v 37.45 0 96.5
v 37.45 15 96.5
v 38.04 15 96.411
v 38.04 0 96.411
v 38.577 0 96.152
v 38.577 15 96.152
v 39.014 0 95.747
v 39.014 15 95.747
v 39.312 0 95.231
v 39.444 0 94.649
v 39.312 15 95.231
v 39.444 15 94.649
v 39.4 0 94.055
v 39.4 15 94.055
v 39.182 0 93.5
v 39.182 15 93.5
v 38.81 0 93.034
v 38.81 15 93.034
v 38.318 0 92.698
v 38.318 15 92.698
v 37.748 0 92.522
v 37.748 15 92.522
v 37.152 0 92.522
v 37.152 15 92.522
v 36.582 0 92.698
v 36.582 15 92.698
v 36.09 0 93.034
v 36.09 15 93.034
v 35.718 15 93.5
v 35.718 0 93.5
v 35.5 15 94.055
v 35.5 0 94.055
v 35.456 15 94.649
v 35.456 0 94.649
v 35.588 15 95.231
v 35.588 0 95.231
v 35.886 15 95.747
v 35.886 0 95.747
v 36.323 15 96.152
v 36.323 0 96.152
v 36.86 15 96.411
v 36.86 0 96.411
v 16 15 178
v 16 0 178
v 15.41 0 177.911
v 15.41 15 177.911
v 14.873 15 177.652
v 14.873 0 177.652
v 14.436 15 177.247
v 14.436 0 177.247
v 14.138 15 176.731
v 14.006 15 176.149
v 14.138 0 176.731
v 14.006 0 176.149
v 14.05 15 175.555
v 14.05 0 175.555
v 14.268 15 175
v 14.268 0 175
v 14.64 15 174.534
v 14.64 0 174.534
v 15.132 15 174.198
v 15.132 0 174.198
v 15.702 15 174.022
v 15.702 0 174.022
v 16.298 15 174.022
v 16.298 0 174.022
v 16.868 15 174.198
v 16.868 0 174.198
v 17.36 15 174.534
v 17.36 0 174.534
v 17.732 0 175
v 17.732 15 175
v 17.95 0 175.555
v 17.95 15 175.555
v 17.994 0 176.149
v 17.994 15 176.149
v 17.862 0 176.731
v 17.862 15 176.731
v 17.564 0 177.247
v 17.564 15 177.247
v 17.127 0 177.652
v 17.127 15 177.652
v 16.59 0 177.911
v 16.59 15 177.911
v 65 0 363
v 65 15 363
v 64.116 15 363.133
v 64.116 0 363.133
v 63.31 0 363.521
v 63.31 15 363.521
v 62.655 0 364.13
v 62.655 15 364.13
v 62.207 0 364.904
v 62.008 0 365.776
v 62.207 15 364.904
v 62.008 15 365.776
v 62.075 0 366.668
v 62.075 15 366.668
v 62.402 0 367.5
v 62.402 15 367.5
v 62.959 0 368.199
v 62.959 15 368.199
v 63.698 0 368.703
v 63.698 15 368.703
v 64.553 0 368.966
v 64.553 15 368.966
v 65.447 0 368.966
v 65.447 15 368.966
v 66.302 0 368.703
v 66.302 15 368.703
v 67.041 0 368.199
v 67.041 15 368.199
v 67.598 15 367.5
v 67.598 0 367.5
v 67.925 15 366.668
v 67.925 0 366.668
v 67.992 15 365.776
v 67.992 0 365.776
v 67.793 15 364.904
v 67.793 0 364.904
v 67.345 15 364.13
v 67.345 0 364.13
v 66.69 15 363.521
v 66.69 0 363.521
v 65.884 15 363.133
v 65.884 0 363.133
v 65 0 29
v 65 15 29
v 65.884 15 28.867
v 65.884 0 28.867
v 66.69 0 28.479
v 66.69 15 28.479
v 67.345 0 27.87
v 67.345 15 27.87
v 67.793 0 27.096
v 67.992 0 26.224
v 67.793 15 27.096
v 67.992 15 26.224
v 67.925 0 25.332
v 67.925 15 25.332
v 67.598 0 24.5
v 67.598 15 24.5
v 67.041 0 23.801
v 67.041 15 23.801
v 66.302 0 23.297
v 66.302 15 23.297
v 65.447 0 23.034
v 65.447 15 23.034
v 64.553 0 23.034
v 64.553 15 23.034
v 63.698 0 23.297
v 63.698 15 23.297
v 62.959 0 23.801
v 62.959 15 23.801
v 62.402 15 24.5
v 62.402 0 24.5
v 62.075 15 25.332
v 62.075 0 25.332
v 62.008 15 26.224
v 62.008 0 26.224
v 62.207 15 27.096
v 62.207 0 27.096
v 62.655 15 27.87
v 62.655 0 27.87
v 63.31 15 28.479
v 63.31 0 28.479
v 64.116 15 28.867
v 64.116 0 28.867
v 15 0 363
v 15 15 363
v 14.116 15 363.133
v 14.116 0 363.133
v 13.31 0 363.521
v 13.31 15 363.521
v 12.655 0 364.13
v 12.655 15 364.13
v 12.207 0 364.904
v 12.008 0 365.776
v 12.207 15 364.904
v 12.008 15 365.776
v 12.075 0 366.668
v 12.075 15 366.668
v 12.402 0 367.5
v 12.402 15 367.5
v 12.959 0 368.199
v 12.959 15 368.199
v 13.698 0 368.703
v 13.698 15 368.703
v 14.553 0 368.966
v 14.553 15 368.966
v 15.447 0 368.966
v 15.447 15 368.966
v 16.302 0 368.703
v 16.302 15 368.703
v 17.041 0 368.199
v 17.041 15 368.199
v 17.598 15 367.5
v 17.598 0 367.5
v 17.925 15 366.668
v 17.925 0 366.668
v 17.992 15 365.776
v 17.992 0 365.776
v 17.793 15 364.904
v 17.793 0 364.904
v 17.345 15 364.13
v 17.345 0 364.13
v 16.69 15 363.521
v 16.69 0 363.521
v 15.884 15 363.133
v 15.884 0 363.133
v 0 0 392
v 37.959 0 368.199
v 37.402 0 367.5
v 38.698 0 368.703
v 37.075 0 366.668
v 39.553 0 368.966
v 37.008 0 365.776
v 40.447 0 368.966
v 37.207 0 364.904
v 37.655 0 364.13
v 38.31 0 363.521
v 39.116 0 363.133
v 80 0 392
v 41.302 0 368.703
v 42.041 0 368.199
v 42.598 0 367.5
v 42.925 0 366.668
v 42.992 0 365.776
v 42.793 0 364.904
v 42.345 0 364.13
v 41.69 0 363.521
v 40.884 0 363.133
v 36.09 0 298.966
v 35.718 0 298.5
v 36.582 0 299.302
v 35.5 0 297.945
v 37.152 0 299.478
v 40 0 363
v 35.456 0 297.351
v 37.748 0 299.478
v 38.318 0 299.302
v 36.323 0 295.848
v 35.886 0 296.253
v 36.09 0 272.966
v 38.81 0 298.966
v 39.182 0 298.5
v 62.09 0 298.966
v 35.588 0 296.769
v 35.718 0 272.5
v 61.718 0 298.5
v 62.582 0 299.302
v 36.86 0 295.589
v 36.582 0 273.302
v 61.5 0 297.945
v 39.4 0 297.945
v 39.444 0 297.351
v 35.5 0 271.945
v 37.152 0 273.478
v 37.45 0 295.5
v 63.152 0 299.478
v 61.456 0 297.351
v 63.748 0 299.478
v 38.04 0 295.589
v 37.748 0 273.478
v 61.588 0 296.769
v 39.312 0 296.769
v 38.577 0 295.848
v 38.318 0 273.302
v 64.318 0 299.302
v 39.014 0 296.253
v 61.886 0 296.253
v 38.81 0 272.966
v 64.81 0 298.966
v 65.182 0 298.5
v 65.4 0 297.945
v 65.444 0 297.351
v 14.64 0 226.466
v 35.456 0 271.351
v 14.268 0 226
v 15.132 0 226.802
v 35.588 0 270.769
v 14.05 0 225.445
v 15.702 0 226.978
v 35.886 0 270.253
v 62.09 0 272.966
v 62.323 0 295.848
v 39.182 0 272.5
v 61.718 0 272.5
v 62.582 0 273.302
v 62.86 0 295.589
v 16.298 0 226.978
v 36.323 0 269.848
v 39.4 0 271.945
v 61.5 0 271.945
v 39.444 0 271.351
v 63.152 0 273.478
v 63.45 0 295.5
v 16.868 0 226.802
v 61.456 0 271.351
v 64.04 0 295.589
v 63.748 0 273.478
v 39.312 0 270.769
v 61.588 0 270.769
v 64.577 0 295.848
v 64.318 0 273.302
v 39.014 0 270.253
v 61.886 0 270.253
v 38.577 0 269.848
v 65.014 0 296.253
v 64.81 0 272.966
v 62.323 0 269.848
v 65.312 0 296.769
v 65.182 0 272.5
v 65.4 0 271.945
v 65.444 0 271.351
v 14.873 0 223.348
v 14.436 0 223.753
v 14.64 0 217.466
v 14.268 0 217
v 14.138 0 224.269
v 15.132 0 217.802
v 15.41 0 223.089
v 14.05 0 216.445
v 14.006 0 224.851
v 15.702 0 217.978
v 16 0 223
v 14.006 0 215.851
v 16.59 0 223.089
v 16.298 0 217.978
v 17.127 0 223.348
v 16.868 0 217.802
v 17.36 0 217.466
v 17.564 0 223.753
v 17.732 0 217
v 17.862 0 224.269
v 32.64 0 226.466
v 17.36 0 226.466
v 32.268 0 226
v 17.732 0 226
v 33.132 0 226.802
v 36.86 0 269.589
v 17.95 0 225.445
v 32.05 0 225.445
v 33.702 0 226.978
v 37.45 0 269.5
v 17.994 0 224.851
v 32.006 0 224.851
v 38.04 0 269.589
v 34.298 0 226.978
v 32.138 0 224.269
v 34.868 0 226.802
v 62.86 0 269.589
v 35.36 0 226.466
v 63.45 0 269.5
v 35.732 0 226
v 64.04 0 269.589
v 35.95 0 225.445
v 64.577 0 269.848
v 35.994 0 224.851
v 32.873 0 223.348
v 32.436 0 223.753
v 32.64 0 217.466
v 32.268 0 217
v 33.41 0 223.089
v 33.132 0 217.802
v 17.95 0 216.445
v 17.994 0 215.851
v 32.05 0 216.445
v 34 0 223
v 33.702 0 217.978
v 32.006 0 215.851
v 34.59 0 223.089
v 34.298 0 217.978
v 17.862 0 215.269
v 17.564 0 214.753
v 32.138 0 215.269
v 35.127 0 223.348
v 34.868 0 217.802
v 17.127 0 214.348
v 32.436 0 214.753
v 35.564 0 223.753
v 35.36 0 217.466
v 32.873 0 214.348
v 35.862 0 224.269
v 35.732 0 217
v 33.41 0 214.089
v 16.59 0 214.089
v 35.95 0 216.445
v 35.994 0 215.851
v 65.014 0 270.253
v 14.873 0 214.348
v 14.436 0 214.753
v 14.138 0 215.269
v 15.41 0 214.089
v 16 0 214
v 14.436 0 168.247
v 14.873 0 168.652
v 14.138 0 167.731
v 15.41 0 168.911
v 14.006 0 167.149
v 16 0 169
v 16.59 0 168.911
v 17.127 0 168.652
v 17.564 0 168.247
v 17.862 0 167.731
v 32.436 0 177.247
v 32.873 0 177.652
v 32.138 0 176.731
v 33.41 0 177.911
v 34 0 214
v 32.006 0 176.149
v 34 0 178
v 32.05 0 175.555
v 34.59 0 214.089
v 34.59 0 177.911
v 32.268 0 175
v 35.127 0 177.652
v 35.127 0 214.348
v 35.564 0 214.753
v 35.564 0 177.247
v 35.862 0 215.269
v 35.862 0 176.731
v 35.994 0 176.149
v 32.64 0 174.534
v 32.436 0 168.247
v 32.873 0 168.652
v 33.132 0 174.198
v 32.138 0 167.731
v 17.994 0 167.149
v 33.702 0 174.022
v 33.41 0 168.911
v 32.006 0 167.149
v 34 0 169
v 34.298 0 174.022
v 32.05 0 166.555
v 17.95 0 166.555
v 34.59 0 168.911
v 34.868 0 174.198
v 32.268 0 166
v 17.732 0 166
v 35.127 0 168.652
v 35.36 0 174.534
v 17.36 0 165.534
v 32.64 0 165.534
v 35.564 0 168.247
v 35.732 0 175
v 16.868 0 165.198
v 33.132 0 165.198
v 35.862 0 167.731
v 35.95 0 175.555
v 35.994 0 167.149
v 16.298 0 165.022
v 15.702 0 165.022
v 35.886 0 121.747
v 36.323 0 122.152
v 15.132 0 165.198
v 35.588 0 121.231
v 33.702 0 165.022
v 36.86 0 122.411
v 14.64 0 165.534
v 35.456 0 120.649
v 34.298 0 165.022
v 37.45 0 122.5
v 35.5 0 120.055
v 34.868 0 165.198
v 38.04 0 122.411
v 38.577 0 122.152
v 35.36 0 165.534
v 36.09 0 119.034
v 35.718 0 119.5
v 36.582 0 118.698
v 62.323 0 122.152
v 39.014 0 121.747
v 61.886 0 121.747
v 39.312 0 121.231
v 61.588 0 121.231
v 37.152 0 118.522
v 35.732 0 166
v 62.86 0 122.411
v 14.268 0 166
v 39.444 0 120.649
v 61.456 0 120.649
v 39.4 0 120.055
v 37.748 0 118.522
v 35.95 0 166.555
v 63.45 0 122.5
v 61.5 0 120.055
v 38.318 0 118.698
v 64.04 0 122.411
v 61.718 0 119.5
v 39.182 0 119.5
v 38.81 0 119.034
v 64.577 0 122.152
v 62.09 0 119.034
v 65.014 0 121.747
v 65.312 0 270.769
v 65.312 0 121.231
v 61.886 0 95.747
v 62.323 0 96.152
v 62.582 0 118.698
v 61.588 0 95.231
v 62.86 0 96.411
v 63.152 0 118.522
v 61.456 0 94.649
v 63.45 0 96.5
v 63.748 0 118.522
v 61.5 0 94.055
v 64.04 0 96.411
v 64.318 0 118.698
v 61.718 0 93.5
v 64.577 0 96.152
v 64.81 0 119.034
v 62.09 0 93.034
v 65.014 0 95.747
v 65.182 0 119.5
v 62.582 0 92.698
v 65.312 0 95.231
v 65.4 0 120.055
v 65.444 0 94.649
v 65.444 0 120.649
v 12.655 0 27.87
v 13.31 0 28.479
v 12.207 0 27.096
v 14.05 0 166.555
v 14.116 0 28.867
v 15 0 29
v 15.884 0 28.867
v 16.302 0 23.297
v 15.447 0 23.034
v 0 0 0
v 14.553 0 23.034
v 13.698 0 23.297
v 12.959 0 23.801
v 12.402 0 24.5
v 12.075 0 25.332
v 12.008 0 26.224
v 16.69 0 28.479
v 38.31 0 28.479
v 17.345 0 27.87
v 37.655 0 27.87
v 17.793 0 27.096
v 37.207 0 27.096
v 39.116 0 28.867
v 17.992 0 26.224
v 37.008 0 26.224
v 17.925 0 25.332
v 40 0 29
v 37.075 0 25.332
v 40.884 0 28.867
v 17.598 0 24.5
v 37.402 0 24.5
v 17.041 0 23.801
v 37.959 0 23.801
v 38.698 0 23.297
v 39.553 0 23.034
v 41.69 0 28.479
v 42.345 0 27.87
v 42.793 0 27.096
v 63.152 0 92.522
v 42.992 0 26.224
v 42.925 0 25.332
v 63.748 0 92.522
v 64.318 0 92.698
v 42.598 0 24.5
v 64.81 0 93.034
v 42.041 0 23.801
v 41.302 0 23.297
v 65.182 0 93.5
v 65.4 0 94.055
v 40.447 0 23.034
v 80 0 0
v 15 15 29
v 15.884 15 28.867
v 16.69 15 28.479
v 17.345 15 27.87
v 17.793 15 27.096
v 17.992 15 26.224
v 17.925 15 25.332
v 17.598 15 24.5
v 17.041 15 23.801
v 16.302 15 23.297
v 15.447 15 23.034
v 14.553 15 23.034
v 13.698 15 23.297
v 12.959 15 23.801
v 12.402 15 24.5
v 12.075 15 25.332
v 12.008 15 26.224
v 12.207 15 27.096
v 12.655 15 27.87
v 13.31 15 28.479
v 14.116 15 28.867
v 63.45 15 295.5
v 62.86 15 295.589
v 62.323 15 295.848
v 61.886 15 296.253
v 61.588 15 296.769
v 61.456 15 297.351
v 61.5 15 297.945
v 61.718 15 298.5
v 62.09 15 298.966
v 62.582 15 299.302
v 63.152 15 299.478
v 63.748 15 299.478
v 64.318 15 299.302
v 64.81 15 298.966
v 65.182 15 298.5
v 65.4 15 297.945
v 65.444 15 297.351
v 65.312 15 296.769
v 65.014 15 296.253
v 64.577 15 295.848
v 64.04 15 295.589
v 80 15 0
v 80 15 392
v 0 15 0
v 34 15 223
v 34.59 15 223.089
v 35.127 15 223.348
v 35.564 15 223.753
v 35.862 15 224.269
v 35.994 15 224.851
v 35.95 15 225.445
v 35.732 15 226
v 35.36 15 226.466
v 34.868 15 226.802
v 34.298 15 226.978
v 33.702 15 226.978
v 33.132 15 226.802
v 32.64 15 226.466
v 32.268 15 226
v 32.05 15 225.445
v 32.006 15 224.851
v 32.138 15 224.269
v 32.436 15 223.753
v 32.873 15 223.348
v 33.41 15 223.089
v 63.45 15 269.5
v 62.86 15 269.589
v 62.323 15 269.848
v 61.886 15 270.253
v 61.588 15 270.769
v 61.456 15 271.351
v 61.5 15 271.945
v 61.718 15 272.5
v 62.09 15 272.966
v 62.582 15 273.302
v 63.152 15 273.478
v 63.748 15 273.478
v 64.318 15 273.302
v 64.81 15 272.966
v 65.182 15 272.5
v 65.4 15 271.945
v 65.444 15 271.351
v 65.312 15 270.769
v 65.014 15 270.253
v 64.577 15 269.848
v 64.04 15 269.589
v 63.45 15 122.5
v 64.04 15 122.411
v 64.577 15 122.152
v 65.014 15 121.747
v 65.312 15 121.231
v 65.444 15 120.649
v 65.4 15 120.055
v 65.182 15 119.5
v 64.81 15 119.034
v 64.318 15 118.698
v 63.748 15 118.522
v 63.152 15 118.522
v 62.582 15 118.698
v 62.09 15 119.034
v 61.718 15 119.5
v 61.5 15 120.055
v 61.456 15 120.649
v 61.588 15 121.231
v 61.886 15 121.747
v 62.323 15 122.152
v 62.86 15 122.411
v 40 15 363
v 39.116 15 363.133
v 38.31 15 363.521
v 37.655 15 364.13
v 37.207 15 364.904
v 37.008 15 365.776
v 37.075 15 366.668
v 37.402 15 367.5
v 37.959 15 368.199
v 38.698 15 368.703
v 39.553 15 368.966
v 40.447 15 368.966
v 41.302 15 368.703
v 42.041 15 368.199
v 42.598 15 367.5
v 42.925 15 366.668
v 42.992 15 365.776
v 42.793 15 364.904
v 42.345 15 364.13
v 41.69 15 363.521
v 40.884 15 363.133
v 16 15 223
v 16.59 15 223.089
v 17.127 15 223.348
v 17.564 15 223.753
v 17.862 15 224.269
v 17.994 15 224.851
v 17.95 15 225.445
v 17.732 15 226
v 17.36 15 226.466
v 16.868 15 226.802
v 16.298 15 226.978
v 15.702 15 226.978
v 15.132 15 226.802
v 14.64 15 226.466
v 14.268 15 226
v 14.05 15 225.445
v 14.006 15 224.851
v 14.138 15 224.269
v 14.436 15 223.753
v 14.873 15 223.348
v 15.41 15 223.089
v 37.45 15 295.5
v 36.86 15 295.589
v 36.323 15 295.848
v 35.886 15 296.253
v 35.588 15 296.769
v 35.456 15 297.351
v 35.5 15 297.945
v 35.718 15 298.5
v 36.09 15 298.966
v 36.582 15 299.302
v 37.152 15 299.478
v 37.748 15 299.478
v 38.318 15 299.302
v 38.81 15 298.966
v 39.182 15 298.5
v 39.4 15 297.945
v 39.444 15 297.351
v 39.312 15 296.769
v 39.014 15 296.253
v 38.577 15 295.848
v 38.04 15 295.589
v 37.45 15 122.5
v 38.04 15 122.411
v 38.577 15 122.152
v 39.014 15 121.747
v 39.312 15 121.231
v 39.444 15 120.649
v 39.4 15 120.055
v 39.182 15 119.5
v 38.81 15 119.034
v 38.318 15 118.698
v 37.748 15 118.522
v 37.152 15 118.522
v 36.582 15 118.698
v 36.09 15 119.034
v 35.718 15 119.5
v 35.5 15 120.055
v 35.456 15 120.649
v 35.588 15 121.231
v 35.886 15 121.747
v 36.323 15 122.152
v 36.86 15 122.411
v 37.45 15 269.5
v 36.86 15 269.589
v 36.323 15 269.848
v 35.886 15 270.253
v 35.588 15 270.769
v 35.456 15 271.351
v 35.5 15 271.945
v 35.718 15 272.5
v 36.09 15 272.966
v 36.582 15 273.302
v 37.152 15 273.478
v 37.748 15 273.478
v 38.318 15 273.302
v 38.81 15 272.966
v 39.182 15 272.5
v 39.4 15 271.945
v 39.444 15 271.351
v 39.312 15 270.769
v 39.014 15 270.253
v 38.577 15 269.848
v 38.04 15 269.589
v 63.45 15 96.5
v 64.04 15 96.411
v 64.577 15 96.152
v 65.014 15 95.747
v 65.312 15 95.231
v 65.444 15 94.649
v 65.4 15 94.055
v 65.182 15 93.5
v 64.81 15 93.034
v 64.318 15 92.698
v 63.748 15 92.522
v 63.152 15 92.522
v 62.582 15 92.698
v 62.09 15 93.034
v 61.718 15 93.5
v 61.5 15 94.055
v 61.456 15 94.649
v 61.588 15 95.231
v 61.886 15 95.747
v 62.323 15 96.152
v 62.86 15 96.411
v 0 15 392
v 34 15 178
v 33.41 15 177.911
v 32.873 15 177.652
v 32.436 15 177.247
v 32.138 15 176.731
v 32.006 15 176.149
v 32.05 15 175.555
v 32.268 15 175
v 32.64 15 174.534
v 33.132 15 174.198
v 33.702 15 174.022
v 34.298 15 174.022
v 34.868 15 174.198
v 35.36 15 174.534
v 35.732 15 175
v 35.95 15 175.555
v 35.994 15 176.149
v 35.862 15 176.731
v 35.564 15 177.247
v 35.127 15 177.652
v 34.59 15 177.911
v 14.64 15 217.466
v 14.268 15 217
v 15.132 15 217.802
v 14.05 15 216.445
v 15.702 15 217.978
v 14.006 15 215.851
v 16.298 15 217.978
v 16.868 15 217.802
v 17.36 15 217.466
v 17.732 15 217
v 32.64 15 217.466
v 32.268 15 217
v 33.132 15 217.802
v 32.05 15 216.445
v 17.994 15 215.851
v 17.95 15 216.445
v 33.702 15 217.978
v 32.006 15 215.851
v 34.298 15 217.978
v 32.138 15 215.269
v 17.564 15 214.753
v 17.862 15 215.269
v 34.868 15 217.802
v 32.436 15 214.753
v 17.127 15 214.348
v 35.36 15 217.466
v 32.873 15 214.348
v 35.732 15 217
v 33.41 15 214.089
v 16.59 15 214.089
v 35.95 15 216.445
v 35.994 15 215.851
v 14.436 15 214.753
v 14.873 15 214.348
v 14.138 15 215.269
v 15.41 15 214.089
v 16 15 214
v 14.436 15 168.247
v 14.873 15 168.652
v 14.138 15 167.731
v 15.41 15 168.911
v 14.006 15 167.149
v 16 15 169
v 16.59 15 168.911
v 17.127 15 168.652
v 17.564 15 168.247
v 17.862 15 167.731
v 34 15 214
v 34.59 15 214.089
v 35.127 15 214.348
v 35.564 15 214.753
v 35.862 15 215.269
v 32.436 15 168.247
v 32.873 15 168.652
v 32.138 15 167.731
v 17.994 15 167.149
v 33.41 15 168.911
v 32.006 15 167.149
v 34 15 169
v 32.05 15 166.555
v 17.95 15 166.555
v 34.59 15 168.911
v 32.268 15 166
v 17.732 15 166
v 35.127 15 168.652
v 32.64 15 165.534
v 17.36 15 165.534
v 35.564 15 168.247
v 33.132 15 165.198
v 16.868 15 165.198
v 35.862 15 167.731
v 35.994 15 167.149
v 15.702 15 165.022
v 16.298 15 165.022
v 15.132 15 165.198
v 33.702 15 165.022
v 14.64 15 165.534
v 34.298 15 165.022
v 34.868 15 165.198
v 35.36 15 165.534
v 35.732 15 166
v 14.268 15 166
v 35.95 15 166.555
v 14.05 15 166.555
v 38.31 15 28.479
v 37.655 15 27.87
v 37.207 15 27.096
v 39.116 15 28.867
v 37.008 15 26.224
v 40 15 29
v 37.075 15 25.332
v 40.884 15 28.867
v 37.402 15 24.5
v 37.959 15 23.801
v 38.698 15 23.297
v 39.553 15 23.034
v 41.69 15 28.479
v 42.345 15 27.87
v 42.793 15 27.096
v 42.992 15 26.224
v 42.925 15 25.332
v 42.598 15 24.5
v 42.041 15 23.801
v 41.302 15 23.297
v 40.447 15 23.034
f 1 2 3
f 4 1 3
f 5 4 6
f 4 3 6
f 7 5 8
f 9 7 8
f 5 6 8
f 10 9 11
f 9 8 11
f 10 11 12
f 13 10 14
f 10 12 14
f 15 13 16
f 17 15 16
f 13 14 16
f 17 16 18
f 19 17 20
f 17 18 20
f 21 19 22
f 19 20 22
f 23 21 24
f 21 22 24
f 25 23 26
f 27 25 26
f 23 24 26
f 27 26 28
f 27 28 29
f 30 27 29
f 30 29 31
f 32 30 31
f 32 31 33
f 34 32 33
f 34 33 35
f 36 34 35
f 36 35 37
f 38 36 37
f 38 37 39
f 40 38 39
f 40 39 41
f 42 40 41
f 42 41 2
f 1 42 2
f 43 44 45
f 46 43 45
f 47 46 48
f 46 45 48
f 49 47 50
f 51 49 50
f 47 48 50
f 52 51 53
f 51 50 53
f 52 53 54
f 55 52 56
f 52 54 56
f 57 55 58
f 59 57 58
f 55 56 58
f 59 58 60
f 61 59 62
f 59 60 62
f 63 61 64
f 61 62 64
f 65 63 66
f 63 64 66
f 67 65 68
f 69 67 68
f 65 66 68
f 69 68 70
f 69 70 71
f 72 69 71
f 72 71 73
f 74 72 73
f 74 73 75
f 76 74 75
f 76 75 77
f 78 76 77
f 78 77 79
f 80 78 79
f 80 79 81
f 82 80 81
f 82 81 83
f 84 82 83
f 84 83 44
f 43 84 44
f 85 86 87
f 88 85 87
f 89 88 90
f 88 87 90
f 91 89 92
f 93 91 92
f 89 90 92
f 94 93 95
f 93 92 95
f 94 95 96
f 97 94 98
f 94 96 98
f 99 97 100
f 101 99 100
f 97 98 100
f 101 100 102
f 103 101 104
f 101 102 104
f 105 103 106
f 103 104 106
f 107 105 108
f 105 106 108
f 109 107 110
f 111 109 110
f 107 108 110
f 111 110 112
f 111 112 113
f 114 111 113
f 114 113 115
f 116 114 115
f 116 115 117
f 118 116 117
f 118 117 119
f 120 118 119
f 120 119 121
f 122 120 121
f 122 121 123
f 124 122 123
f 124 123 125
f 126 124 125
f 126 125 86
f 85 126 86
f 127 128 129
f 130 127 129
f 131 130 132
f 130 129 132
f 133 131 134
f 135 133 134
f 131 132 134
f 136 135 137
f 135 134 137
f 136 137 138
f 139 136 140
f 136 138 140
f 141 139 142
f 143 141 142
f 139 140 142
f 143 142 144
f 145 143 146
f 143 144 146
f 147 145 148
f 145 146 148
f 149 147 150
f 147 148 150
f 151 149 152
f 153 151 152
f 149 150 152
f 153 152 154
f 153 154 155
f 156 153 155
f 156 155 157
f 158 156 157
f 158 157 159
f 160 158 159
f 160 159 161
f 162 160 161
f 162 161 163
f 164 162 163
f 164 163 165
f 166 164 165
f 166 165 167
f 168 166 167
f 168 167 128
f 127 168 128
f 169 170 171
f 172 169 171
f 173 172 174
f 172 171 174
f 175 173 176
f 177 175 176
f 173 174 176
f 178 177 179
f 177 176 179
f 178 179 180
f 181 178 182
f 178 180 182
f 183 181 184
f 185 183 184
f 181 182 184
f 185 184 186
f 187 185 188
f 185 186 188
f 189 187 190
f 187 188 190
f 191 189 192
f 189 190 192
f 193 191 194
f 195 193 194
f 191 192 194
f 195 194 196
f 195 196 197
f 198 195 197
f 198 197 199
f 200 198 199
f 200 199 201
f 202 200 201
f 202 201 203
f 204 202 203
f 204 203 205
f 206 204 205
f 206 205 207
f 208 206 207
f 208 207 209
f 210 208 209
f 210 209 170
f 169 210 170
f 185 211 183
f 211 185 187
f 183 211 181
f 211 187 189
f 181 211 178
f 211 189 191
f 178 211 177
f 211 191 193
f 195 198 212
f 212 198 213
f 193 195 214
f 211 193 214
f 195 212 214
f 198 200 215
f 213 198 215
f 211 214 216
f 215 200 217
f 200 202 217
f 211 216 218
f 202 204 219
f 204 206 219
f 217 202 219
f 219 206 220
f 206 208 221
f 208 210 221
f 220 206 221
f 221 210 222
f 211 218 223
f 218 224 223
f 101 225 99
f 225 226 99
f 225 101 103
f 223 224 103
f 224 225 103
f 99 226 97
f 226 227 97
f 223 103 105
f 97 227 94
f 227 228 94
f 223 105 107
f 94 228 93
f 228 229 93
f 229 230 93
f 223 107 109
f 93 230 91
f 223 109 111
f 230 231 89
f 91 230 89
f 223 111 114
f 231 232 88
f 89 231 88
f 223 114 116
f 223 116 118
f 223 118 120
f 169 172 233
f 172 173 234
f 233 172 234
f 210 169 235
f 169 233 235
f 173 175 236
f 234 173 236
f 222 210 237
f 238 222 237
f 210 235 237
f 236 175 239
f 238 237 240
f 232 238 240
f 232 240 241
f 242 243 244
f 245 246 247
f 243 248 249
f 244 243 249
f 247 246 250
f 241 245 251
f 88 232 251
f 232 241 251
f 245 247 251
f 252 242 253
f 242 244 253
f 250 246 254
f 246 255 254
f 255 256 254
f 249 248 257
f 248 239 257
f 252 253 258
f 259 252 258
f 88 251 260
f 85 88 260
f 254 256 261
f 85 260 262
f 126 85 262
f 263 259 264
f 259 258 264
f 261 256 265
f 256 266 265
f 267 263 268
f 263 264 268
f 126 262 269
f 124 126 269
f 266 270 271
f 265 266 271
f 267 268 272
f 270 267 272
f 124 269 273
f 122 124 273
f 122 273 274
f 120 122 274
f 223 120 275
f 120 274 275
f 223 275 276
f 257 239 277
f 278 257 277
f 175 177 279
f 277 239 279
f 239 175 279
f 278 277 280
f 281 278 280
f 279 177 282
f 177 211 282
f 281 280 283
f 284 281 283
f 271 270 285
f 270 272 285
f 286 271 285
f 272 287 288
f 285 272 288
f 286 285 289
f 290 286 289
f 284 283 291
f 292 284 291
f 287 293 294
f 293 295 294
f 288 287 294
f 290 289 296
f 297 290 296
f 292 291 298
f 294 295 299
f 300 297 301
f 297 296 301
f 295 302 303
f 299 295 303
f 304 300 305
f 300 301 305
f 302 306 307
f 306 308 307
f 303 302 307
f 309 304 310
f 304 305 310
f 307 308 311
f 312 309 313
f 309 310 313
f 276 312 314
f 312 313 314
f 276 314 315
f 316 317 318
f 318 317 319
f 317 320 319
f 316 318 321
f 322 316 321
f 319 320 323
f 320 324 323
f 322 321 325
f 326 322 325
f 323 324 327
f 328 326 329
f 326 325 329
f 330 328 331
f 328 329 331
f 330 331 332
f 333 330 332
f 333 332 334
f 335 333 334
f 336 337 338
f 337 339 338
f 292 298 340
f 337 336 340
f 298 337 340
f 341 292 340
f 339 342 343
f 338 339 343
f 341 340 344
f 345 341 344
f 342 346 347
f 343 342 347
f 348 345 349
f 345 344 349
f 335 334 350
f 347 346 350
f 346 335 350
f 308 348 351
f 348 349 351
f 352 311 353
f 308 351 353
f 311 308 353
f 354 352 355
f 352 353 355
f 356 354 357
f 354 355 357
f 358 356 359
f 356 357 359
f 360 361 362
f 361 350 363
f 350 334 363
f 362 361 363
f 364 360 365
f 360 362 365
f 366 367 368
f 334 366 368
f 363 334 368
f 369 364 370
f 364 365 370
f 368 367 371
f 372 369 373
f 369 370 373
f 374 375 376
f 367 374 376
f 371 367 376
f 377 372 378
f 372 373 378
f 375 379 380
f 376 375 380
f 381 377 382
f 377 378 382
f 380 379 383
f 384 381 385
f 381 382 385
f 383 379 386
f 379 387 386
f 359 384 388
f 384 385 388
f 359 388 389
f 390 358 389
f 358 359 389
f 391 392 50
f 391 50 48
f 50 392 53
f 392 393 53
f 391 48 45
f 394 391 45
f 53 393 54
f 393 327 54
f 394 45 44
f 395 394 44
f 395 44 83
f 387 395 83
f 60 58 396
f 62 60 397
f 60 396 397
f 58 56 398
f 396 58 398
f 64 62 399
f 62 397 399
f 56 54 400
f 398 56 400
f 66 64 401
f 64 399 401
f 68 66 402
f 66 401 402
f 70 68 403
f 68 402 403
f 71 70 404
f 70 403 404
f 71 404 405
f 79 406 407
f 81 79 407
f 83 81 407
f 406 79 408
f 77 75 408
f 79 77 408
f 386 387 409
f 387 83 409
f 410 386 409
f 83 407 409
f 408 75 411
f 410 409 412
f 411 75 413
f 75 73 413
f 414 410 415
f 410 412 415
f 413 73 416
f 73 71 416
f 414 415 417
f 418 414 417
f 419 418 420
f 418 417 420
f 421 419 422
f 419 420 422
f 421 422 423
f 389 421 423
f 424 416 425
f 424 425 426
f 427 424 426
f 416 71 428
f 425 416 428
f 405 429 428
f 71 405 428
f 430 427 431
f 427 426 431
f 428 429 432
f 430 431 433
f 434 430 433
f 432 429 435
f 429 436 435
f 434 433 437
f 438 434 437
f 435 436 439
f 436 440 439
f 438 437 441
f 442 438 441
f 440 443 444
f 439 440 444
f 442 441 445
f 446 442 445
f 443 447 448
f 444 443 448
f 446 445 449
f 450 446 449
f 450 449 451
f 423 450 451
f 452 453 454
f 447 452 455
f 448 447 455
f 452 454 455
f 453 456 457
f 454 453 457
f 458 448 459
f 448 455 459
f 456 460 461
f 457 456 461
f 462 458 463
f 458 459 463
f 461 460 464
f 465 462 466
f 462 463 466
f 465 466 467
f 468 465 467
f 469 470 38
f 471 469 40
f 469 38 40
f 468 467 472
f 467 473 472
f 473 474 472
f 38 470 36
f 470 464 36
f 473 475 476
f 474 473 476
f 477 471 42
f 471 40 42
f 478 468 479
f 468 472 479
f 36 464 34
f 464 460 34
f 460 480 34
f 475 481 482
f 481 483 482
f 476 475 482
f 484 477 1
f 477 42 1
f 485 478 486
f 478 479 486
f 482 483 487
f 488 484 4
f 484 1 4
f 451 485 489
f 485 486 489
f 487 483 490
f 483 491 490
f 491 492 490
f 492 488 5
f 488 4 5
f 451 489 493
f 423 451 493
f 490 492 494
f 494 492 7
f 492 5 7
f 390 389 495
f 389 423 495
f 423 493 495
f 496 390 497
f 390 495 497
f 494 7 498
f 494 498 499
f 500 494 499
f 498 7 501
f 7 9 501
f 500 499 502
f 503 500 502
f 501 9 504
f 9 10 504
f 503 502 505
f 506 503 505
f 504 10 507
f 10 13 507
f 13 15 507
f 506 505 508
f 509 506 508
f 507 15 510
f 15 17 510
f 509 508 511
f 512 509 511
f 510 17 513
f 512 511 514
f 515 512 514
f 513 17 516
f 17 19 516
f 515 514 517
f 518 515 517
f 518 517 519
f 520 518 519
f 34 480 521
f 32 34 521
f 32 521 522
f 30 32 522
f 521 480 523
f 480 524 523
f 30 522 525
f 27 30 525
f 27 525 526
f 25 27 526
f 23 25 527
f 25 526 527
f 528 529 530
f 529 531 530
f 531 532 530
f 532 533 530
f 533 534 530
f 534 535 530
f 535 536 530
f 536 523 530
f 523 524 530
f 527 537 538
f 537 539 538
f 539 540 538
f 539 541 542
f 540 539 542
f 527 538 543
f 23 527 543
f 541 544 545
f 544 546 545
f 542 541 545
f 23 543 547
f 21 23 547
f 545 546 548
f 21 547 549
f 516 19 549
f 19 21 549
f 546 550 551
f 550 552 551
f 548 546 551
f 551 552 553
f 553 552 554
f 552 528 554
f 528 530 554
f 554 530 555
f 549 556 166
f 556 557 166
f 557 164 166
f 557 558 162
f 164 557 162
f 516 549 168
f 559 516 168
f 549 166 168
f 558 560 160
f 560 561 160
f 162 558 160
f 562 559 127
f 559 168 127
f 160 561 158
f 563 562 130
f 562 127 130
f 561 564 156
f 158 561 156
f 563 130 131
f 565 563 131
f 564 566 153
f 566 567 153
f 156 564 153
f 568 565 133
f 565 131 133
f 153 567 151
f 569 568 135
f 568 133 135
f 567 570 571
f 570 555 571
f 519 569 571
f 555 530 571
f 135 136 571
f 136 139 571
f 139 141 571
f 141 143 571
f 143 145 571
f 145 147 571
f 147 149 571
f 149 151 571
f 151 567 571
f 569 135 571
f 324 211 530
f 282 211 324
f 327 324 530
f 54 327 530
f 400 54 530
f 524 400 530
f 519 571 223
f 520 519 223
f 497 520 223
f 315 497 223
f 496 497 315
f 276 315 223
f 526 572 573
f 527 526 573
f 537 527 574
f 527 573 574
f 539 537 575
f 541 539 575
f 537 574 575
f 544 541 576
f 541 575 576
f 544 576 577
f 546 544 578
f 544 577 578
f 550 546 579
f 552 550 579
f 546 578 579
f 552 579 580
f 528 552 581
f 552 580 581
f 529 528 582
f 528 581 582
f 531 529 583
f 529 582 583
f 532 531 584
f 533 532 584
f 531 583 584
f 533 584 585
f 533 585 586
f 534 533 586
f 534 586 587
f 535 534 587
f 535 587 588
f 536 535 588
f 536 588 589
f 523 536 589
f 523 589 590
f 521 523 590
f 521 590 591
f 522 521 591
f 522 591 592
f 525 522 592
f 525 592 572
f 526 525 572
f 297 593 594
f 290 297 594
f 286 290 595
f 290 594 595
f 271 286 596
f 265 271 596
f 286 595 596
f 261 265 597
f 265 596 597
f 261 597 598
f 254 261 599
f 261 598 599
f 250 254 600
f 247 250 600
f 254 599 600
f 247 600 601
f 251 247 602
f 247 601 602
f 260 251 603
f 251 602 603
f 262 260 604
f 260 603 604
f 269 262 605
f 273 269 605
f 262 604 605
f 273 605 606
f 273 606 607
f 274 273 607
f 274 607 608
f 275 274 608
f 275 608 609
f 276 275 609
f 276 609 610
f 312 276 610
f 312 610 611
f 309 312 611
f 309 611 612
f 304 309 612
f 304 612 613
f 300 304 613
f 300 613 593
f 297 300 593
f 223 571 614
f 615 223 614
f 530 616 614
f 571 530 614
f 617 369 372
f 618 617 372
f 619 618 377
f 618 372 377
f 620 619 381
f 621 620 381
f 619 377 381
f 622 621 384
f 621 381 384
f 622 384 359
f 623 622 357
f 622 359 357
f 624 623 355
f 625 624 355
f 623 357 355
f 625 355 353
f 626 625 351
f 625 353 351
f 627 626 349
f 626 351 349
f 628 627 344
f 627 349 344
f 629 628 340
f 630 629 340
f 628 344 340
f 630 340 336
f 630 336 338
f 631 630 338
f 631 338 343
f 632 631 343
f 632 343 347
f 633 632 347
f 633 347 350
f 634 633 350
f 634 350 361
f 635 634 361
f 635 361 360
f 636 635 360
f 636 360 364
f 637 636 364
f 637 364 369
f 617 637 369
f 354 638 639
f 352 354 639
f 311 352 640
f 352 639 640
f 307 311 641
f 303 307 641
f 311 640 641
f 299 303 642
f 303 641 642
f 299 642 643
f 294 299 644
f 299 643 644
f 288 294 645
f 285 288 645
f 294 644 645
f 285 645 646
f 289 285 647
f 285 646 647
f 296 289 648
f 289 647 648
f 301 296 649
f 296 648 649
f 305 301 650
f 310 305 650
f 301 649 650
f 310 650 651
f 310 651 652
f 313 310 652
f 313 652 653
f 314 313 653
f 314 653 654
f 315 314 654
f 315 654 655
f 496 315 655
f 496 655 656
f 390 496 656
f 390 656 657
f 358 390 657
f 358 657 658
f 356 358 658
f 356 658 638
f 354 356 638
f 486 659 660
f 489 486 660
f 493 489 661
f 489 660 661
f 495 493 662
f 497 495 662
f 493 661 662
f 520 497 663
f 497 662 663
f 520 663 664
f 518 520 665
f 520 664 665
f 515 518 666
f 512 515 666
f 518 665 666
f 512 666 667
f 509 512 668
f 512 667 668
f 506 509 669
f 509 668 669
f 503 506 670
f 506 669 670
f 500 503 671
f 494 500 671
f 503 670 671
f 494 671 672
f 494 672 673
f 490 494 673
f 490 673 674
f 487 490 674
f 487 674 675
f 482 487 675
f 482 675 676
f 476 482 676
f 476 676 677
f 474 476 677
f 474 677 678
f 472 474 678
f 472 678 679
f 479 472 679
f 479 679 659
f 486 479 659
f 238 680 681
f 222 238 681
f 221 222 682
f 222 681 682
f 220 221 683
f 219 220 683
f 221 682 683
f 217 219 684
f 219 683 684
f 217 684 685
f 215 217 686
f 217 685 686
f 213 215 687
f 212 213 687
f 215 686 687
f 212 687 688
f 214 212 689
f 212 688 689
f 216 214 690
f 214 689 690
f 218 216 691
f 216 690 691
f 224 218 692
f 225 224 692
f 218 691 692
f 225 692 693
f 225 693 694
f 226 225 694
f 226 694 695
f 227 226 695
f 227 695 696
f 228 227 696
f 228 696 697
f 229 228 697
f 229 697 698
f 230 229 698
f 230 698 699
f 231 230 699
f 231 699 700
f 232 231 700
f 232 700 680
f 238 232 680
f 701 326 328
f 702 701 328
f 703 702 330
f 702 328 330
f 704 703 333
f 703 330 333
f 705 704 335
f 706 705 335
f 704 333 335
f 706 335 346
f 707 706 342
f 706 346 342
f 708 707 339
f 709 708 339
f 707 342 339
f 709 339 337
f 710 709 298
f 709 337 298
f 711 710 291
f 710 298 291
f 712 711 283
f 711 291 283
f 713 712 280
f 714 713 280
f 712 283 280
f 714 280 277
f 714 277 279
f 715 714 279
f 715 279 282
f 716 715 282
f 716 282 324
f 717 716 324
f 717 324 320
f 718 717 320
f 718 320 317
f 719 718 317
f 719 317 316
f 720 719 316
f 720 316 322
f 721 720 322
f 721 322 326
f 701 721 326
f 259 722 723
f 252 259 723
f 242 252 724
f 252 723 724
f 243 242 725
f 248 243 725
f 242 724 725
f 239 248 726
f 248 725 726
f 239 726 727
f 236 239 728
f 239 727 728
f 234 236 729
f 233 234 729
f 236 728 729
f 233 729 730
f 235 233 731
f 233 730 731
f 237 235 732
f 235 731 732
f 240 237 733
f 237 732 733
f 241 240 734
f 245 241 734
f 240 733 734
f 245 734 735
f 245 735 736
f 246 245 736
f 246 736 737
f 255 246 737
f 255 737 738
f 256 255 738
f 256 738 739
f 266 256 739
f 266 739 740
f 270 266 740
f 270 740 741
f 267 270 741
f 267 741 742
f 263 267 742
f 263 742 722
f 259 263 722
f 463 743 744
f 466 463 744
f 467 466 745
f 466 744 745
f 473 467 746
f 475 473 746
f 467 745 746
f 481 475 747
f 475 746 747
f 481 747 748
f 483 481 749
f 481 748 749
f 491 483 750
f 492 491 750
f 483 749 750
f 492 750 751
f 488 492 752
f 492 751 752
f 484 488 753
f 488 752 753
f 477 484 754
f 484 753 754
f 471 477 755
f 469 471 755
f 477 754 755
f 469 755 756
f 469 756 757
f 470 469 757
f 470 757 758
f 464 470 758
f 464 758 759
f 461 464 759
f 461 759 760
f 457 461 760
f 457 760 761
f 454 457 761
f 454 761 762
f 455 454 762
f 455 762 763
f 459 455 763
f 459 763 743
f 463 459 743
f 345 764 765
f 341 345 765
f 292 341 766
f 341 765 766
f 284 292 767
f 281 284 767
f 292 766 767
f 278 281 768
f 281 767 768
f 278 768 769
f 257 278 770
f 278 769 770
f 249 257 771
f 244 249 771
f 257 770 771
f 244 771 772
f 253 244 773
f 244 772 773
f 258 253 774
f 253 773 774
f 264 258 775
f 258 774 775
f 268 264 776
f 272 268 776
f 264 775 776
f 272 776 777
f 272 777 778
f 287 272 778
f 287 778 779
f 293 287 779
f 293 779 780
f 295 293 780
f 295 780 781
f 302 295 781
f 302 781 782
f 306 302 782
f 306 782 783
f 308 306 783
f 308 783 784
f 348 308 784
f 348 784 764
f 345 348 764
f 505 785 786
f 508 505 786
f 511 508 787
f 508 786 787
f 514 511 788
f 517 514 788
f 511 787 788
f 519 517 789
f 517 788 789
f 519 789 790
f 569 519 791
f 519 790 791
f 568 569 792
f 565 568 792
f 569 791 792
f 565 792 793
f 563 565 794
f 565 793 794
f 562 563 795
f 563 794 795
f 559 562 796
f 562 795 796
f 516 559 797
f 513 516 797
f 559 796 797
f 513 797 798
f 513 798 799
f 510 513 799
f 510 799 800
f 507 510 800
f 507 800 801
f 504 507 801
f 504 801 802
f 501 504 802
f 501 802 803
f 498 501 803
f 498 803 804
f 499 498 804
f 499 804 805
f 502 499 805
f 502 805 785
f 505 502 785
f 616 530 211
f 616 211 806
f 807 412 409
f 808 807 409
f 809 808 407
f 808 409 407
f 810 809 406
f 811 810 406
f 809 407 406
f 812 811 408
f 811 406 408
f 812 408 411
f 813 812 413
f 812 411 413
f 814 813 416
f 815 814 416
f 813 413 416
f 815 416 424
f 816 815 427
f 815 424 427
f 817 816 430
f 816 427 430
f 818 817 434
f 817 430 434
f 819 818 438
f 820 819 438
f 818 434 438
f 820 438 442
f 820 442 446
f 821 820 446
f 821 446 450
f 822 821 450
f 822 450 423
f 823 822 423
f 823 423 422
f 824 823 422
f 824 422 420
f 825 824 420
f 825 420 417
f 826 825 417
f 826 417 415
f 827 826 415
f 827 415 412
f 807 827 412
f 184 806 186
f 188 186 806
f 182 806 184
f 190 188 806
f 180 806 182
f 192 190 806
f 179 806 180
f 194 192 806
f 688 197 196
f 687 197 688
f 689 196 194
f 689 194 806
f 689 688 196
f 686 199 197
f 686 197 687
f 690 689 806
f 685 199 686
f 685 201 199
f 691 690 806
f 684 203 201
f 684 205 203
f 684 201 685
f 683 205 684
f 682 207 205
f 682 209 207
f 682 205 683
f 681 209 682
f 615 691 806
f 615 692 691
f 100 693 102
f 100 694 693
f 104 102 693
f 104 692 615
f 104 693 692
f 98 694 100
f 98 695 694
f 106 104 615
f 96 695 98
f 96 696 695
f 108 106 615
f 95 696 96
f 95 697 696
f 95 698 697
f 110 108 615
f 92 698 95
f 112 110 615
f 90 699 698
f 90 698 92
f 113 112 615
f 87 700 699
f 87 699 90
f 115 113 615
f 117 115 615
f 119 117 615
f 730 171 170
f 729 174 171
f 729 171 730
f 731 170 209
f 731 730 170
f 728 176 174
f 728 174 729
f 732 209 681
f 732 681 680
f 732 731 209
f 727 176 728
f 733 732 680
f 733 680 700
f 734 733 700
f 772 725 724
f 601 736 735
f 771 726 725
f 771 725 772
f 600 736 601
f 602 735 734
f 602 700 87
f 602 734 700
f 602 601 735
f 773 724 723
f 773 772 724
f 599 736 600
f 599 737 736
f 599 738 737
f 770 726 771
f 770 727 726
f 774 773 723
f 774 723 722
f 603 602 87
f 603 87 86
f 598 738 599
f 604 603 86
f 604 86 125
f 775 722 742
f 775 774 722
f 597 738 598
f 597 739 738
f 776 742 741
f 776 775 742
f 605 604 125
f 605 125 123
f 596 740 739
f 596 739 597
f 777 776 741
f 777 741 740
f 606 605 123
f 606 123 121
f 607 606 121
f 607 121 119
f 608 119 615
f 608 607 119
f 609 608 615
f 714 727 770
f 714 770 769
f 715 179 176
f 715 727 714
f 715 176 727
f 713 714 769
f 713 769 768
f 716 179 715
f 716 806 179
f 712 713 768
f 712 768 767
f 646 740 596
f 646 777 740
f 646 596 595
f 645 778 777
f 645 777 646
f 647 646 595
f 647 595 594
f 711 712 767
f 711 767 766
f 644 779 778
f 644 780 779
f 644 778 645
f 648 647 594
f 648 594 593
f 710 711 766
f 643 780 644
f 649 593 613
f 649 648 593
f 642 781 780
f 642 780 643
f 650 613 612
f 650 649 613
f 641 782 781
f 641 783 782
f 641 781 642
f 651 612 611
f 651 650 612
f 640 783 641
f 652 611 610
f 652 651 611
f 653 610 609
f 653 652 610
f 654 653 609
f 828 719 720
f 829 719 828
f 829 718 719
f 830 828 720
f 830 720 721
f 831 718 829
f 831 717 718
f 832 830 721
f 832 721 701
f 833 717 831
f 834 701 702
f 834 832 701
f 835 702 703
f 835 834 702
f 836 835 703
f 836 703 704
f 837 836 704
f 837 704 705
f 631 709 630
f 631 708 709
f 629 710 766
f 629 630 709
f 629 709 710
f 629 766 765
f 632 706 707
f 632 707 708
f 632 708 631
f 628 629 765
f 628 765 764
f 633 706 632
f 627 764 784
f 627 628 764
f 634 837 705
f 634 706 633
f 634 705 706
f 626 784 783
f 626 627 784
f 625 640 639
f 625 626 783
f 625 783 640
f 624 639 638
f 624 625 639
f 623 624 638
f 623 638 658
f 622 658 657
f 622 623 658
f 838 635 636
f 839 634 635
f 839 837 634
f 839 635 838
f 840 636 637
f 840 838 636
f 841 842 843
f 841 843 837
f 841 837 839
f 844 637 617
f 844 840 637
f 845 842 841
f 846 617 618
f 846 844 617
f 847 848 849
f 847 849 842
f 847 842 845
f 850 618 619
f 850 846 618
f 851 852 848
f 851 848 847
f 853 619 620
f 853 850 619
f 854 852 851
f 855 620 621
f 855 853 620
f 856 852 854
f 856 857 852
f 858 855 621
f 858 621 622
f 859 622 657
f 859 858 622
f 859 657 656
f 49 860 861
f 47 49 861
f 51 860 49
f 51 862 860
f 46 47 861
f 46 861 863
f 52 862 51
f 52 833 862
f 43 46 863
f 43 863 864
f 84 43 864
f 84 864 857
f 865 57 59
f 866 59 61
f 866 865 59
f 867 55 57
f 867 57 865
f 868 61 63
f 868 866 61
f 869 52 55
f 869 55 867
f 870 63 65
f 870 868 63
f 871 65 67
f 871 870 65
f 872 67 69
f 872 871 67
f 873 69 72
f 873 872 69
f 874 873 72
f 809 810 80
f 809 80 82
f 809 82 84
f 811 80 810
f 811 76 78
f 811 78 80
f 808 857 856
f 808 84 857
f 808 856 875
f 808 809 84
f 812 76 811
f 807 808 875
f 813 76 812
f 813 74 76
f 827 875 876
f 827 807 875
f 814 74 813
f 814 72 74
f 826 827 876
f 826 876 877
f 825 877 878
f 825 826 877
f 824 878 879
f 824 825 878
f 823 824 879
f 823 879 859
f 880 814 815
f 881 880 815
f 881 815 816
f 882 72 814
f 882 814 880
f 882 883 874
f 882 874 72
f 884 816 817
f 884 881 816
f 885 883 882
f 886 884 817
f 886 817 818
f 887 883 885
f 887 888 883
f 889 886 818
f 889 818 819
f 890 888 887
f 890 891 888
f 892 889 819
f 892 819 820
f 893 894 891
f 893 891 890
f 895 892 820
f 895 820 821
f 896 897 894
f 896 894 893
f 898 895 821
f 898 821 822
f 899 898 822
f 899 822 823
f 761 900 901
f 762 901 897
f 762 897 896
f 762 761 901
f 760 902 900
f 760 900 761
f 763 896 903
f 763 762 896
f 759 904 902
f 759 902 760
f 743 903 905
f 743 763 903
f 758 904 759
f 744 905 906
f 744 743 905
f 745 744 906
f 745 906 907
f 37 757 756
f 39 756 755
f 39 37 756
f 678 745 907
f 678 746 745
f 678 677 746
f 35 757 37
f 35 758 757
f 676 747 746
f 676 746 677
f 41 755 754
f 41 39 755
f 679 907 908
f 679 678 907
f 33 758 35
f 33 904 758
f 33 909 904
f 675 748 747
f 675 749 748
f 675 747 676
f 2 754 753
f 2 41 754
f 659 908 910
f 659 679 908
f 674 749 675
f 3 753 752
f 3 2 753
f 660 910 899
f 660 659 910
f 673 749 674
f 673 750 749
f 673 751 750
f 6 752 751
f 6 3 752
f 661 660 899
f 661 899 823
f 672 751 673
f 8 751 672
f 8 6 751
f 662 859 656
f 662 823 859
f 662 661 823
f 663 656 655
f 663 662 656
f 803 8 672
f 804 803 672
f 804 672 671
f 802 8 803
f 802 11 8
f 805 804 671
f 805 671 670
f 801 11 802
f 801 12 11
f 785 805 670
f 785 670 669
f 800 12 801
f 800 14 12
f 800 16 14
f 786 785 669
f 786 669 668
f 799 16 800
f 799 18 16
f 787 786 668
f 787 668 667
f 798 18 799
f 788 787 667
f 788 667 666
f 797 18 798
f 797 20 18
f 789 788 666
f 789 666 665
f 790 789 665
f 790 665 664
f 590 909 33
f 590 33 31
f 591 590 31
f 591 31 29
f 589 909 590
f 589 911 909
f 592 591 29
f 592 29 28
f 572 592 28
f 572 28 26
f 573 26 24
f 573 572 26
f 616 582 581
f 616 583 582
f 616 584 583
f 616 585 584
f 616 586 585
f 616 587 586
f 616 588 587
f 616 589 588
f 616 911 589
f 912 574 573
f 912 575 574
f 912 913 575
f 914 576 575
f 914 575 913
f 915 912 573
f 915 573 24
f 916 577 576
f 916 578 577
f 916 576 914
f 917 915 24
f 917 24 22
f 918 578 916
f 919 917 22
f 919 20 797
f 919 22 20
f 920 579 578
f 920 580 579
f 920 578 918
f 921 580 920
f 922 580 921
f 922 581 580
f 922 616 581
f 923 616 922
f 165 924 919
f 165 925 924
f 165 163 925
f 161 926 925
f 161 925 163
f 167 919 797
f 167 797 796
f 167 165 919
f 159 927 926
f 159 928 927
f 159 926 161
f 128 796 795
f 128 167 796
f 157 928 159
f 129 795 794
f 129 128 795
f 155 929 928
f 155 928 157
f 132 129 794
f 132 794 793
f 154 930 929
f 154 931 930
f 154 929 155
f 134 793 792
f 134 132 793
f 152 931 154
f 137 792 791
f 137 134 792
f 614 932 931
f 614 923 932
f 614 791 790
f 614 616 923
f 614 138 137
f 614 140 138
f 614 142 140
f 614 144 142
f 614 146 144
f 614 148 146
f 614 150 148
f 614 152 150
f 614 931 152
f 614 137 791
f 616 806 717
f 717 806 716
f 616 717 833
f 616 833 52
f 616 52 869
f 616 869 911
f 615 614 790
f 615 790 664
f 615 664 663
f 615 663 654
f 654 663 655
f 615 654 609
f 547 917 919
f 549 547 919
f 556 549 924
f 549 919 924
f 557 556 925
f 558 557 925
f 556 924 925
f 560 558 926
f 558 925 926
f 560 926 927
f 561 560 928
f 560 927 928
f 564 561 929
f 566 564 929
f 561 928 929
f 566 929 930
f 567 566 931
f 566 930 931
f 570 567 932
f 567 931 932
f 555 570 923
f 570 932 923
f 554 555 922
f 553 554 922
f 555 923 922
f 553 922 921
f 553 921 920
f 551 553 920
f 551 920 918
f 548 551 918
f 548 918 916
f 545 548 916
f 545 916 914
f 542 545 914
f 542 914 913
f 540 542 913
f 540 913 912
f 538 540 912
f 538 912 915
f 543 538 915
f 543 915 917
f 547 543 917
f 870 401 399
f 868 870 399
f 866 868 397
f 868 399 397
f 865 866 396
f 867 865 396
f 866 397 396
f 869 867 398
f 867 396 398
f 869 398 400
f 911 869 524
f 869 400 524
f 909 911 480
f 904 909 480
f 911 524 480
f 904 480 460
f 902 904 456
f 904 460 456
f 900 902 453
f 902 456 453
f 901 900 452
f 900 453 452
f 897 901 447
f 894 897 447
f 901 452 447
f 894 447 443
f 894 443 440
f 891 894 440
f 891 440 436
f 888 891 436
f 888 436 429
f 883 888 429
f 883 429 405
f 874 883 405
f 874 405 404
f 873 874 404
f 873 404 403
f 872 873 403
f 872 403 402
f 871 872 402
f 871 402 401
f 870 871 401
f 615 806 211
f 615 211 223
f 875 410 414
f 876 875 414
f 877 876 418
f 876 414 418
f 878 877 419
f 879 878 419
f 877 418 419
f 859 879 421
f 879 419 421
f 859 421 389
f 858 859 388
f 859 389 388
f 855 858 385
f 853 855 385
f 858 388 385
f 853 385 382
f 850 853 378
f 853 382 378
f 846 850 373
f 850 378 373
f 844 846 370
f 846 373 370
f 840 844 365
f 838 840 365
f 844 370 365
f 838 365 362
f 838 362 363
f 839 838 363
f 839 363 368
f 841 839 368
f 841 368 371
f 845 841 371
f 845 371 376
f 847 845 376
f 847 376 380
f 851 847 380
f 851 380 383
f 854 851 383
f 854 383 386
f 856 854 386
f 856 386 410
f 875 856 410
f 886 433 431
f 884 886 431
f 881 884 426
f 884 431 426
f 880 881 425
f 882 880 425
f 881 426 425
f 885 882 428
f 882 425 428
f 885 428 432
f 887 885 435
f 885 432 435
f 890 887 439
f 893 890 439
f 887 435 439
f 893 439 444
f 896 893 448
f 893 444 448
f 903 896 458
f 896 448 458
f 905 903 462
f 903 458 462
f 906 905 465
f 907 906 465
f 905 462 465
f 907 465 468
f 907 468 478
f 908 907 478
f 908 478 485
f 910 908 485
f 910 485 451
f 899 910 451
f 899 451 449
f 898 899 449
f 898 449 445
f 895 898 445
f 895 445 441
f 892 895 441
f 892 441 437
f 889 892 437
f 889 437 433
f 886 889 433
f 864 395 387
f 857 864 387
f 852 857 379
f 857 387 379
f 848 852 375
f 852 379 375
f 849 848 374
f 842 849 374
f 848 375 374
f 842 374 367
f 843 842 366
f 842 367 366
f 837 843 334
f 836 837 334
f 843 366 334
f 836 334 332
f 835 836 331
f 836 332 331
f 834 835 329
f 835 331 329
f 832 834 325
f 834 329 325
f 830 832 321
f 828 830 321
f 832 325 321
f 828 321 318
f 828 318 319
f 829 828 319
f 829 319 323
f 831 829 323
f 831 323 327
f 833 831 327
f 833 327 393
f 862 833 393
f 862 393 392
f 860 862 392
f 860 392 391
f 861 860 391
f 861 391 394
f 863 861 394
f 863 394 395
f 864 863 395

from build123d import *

# Parameters (mm, degrees)
SKETCH_1_W          = 80
SKETCH_1_H          = 15
EXTRUDE_1_DEPTH     = 392
SKETCH_2_R          = 3
CUT_EXTRUDE_1_DEPTH = 401.36108702
SKETCH_3_R          = 2
CUT_EXTRUDE_2_DEPTH = 401.36108702
SKETCH_4_R          = 2
CUT_EXTRUDE_3_DEPTH = 401.36108702


with BuildPart() as part:
    # 草图1 → 凸台-拉伸1 (new body)
    with BuildSketch(Plane.XY):
        with Locations((40, 7.5)):
            Rectangle(SKETCH_1_W, SKETCH_1_H)
    extrude(amount=EXTRUDE_1_DEPTH)

    # 草图2 → 切除-拉伸1 (cut, through all)
    with BuildSketch(Plane(origin=(0, 15, 0), x_dir=(1, 0, 0), z_dir=(0, 1, 0))):
        with Locations(Location((65, -26, 0), (0, 0, 270))):
            Circle(SKETCH_2_R)
        with Locations(Location((40, -26, 0), (0, 0, 270))):
            Circle(SKETCH_2_R)
        with Locations(Location((15, -26, 0), (0, 0, 270))):
            Circle(SKETCH_2_R)
        with Locations(Location((15, -366, 0), (0, 0, 90))):
            Circle(SKETCH_2_R)
        with Locations(Location((40, -366, 0), (0, 0, 90))):
            Circle(SKETCH_2_R)
        with Locations(Location((65, -366, 0), (0, 0, 90))):
            Circle(SKETCH_2_R)
    extrude(amount=-CUT_EXTRUDE_1_DEPTH, mode=Mode.SUBTRACT)

    # 草图3 → 切除-拉伸2 (cut, through all)
    with BuildSketch(Plane(origin=(0, 0, 0), x_dir=(-1, 0, 0), z_dir=(0, -1, 0))):
        with Locations(Location((-34, -216, 0), (0, 0, 90))):
            Circle(SKETCH_3_R)
        with Locations(Location((-34, -225, 0), (0, 0, 90))):
            Circle(SKETCH_3_R)
        with Locations(Location((-16, -225, 0), (0, 0, 90))):
            Circle(SKETCH_3_R)
        with Locations(Location((-16, -216, 0), (0, 0, 90))):
            Circle(SKETCH_3_R)
        with Locations(Location((-16, -176, 0), (0, 0, 270))):
            Circle(SKETCH_3_R)
        with Locations(Location((-16, -167, 0), (0, 0, 270))):
            Circle(SKETCH_3_R)
        with Locations(Location((-34, -167, 0), (0, 0, 270))):
            Circle(SKETCH_3_R)
        with Locations(Location((-34, -176, 0), (0, 0, 270))):
            Circle(SKETCH_3_R)
    extrude(amount=-CUT_EXTRUDE_2_DEPTH, mode=Mode.SUBTRACT)

    # 草图4 → 切除-拉伸3 (cut, through all)
    with BuildSketch(Plane(origin=(0, 15, 0), x_dir=(1, 0, 0), z_dir=(0, 1, 0))):
        with Locations(Location((63.45, -94.5, 0), (0, 0, 270))):
            Circle(SKETCH_4_R)
        with Locations(Location((37.45, -94.5, 0), (0, 0, 270))):
            Circle(SKETCH_4_R)
        with Locations(Location((37.45, -120.5, 0), (0, 0, 270))):
            Circle(SKETCH_4_R)
        with Locations(Location((63.45, -120.5, 0), (0, 0, 270))):
            Circle(SKETCH_4_R)
        with Locations(Location((63.45, -271.5, 0), (0, 0, 90))):
            Circle(SKETCH_4_R)
        with Locations(Location((37.45, -271.5, 0), (0, 0, 90))):
            Circle(SKETCH_4_R)
        with Locations(Location((37.45, -297.5, 0), (0, 0, 90))):
            Circle(SKETCH_4_R)
        with Locations(Location((63.45, -297.5, 0), (0, 0, 90))):
            Circle(SKETCH_4_R)
    extrude(amount=-CUT_EXTRUDE_3_DEPTH, mode=Mode.SUBTRACT)


solid = part.part
